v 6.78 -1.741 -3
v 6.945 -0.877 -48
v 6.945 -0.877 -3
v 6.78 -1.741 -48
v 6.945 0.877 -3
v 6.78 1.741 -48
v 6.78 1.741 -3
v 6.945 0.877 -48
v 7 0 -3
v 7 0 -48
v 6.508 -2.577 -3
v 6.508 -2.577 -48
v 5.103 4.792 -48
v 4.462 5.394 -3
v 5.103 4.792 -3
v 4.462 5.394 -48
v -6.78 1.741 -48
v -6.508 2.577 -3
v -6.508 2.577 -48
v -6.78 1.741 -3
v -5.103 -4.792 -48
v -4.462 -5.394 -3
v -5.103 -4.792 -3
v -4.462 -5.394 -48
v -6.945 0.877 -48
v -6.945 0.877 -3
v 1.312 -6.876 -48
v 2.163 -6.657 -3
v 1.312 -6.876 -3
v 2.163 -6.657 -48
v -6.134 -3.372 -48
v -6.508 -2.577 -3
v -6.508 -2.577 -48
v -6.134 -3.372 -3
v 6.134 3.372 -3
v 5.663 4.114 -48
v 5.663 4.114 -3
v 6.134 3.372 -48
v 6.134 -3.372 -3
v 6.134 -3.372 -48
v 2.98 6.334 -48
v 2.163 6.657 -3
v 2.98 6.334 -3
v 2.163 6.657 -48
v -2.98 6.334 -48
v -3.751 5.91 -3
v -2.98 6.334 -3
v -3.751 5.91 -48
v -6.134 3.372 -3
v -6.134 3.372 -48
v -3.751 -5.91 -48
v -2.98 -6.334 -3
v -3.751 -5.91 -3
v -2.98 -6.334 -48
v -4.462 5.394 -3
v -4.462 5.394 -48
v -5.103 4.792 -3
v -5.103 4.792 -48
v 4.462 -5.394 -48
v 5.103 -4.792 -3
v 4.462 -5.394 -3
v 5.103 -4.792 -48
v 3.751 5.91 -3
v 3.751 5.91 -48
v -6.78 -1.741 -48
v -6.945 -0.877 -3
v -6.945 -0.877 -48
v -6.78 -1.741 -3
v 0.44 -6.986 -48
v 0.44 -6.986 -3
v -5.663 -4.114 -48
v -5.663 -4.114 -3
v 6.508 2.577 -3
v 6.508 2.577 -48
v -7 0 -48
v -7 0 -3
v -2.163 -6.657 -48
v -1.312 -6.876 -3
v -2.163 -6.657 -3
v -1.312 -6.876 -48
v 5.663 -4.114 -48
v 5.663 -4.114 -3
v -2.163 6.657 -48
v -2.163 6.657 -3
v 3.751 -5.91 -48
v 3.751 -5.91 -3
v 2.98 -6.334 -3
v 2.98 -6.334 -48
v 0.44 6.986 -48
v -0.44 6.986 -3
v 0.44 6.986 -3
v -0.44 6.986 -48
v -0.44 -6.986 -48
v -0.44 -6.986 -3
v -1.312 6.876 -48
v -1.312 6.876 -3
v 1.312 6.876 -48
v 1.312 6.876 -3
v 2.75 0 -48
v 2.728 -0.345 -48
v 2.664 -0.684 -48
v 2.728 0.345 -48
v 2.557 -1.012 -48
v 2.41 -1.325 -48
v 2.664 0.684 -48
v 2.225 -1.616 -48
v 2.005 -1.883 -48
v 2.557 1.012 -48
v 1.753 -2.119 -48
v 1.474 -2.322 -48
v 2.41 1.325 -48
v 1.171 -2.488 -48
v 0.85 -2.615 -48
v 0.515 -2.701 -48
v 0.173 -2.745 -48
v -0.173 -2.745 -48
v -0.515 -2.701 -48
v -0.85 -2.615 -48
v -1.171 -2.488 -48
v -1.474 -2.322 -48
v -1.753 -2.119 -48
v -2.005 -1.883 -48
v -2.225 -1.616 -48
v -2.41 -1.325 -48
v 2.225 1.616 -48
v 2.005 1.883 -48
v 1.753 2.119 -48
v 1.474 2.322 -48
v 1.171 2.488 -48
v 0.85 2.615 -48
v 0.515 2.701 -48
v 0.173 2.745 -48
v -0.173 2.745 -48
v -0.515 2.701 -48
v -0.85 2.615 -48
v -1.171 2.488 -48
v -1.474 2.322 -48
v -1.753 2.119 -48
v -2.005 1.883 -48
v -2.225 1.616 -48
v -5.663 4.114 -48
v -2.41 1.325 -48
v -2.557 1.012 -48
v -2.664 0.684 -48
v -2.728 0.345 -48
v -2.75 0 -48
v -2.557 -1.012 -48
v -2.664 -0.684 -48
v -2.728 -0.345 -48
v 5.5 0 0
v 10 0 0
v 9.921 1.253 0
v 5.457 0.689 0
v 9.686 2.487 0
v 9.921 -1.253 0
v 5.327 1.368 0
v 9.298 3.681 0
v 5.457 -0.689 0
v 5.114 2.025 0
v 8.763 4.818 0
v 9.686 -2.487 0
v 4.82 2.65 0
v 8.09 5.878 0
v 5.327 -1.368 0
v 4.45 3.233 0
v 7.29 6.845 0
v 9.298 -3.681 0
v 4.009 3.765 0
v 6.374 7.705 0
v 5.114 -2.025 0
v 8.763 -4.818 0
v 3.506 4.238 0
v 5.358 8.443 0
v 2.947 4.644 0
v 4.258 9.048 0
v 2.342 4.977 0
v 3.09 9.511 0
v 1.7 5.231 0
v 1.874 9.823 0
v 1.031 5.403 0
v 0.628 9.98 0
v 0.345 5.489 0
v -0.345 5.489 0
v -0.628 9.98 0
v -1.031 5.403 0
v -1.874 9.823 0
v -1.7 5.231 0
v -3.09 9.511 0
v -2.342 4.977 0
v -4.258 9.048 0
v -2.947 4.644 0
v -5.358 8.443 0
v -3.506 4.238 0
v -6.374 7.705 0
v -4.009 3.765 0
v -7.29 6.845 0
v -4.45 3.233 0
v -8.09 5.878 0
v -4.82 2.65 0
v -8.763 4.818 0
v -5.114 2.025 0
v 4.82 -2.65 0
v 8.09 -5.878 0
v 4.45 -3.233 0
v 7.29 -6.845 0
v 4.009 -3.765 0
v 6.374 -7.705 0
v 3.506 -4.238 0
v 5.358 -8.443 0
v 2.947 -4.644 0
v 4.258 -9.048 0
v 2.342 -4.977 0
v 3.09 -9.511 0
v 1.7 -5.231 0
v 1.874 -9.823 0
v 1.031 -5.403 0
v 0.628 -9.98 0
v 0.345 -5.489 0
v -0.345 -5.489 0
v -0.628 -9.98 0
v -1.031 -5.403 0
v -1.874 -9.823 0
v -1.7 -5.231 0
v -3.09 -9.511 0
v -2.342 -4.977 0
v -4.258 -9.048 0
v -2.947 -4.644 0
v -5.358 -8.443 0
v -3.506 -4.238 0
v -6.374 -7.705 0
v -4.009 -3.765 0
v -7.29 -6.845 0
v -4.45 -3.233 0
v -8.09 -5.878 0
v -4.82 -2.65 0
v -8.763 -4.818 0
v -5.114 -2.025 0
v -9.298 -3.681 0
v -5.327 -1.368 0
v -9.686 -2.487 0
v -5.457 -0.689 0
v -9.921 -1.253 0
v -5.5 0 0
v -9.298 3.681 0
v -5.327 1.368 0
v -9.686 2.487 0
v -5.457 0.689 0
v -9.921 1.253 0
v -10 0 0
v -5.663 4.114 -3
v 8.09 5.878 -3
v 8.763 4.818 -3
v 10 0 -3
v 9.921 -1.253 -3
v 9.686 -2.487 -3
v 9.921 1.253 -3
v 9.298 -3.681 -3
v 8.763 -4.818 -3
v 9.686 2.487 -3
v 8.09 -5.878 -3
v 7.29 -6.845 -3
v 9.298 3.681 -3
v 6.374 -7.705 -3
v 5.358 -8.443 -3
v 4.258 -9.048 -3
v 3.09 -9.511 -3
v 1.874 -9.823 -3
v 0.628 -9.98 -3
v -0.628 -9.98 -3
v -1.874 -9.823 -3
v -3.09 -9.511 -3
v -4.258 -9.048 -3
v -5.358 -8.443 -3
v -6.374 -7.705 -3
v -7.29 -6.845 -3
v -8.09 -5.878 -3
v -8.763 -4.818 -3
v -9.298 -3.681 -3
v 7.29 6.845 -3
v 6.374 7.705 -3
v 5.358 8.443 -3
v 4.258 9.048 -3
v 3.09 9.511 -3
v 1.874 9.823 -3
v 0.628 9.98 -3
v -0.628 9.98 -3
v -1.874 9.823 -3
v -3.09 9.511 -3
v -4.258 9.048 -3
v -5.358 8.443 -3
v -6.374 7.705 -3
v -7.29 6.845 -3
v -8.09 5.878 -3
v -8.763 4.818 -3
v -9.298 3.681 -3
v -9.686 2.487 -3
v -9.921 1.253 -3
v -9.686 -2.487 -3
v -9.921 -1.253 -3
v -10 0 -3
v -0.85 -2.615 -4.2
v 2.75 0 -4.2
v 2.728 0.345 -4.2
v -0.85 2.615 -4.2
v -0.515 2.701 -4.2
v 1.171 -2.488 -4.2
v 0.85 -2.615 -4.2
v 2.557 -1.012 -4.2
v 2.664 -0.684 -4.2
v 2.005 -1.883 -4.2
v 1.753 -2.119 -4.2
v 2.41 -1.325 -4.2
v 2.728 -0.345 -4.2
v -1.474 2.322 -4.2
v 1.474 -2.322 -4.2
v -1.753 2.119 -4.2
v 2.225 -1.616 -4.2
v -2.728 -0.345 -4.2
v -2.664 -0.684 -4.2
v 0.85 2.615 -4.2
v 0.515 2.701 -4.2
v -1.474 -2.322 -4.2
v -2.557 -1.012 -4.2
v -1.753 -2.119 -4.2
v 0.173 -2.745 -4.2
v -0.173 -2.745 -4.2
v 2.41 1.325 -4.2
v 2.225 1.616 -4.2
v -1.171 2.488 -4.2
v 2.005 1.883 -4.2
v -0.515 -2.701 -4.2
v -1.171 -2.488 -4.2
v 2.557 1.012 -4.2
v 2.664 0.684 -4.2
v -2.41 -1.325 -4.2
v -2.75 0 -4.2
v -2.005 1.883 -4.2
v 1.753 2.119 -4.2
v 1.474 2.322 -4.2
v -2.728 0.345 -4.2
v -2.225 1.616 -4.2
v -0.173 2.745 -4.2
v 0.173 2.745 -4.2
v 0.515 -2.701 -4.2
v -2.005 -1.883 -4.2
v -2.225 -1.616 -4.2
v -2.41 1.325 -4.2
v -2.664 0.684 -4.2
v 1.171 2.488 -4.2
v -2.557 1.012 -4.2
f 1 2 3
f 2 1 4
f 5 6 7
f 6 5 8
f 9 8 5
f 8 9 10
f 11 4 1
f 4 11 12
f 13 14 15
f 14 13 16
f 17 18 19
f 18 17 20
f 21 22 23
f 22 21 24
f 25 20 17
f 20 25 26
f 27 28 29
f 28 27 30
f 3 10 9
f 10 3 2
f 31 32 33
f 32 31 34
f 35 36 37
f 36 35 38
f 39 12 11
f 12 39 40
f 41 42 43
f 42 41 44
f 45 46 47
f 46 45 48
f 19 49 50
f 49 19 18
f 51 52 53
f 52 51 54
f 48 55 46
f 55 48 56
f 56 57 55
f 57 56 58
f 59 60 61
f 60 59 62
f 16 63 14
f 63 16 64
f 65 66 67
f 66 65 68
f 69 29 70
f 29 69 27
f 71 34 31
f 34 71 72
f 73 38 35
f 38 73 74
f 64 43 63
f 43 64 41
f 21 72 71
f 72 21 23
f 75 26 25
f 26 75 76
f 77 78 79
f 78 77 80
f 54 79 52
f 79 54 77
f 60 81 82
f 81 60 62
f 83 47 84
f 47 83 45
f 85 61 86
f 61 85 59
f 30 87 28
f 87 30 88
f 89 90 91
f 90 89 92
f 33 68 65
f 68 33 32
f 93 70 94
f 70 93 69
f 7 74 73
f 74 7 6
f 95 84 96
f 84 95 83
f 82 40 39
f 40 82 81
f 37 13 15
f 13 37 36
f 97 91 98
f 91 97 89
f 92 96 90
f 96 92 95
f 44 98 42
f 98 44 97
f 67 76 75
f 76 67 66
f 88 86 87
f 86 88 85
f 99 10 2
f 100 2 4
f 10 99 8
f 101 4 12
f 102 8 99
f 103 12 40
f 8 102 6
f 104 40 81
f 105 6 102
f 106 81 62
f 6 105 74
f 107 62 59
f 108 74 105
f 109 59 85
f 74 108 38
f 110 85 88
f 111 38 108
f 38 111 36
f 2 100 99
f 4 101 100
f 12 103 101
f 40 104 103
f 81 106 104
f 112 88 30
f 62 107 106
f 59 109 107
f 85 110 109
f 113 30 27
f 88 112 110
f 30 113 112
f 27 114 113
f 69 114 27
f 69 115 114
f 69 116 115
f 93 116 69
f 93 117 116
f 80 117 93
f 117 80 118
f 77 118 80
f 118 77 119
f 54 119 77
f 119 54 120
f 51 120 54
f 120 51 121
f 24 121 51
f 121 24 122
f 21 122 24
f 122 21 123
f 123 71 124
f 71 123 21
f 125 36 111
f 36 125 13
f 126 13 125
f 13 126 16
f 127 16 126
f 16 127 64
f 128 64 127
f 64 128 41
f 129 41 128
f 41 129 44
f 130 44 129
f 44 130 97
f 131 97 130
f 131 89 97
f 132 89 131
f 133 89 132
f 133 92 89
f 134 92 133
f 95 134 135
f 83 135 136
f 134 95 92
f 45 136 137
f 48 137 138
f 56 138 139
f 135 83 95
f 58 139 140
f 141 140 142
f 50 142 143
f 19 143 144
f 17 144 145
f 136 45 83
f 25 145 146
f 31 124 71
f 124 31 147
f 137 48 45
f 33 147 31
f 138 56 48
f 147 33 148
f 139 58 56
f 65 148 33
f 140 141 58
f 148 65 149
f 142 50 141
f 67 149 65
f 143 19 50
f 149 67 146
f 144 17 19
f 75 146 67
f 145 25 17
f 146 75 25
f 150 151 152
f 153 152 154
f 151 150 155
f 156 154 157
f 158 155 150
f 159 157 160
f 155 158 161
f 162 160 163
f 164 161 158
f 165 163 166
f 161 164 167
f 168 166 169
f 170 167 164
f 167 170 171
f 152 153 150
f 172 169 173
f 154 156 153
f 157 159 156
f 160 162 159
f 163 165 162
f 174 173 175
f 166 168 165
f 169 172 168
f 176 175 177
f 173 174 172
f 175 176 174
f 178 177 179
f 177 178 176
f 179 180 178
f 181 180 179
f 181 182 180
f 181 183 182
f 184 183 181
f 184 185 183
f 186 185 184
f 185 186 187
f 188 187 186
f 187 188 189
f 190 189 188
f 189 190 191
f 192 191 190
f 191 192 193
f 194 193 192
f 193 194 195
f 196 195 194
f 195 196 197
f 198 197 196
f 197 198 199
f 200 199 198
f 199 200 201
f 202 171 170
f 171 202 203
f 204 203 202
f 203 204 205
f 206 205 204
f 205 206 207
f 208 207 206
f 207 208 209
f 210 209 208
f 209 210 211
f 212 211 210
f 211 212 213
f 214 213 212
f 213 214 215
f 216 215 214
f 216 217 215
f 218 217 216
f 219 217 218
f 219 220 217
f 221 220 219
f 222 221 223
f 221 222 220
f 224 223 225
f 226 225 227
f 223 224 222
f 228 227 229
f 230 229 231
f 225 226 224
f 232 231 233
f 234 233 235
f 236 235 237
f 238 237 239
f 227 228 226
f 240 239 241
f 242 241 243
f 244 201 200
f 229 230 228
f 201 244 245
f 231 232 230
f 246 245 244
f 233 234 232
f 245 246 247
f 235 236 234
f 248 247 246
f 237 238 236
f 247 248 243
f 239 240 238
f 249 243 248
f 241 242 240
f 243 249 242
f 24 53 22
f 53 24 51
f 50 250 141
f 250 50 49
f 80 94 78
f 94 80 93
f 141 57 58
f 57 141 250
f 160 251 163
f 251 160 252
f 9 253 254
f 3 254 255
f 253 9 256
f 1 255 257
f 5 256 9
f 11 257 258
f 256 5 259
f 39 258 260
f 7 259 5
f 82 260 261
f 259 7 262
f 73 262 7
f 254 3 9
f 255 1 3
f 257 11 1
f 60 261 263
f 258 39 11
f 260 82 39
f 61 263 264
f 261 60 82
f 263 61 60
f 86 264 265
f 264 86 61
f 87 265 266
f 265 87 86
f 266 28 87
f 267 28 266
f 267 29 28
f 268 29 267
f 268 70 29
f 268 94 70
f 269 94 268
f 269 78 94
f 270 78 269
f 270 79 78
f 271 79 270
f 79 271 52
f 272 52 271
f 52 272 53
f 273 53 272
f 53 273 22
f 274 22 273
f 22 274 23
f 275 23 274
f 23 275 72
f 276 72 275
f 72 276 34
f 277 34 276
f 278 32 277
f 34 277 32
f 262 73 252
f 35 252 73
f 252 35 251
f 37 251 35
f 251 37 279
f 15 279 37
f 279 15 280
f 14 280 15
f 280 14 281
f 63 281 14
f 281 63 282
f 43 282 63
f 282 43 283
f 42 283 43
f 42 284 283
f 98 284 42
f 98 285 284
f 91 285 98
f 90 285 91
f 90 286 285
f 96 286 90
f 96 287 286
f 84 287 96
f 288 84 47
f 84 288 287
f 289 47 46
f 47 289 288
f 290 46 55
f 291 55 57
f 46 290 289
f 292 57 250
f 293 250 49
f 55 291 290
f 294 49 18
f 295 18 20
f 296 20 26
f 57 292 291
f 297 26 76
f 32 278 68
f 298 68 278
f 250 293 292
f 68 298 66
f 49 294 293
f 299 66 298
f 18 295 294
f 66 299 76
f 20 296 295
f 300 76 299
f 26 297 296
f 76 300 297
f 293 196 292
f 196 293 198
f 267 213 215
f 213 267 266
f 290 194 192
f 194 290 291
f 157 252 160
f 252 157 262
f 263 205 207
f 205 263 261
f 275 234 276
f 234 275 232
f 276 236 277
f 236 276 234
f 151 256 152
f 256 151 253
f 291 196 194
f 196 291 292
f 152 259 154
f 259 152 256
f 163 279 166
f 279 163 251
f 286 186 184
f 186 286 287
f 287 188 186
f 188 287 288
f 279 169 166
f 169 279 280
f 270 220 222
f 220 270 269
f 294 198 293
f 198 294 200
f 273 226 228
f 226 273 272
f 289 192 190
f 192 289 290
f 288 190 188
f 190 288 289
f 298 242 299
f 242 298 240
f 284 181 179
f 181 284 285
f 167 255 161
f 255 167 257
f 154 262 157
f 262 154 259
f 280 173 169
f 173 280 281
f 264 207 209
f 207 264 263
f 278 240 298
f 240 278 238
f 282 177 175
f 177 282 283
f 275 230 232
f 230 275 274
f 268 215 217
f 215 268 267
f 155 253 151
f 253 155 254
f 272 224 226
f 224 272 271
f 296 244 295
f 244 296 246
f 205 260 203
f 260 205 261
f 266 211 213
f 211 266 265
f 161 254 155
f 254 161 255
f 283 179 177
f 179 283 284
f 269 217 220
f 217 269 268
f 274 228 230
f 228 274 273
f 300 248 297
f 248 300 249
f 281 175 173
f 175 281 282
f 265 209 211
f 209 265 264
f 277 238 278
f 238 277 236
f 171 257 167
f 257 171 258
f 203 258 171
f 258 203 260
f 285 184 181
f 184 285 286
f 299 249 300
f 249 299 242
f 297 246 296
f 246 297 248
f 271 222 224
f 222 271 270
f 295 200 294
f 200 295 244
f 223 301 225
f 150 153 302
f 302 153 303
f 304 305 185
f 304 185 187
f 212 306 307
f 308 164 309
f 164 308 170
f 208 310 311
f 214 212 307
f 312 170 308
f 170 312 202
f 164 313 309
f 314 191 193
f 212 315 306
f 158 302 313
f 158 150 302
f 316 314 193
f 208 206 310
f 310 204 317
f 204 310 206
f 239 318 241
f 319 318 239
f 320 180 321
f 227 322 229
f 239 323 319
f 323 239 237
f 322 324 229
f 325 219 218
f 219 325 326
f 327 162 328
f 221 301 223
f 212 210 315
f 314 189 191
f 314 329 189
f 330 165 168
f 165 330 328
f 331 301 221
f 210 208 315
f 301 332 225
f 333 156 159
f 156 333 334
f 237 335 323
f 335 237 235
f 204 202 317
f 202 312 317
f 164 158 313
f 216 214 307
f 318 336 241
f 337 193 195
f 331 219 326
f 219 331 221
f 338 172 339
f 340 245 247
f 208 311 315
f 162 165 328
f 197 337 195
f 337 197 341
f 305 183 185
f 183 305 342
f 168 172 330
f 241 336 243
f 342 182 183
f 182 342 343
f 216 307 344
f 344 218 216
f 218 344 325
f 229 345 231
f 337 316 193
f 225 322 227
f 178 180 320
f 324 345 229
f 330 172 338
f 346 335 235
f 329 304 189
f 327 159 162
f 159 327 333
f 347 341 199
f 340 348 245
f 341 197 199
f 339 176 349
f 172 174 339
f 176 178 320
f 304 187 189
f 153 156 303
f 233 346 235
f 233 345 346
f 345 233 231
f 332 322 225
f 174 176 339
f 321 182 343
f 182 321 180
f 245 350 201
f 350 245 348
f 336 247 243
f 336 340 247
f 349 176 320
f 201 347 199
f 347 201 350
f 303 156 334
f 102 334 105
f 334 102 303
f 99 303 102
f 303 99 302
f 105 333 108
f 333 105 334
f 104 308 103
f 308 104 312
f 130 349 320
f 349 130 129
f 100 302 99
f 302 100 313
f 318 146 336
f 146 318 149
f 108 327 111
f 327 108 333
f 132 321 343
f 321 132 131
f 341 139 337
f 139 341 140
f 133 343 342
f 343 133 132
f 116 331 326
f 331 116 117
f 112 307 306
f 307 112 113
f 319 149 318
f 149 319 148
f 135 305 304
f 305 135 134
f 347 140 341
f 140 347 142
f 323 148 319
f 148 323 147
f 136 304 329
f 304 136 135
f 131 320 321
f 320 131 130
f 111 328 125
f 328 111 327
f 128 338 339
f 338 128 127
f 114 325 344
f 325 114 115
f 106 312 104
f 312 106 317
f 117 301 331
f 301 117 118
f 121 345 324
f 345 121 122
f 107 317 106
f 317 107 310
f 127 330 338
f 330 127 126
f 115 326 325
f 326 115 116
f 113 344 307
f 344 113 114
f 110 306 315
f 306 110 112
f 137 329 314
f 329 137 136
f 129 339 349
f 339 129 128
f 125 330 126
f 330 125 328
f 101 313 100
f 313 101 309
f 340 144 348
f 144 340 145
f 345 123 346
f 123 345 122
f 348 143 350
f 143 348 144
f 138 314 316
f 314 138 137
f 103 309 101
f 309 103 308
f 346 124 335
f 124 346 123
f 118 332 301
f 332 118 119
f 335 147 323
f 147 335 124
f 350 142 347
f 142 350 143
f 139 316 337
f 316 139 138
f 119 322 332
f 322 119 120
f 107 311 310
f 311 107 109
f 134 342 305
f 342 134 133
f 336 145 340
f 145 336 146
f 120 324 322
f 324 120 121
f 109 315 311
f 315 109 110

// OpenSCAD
$fn = 50;


difference() {
	union() {
		translate(v = [0, 0, -48.0000000000]) {
			cylinder(h = 48, r = 7.0000000000);
		}
		translate(v = [0, 0, -3.0000000000]) {
			cylinder(h = 3, r = 10.0000000000);
		}
	}
	union() {
		translate(v = [0, 0, 0]) {
			rotate(a = [0, 0, 0]) {
				difference() {
					union() {
						#translate(v = [0, 0, -48.0000000000]) {
							cylinder(h = 48, r = 2.2500000000);
						}
						#translate(v = [0, 0, -4.2000000000]) {
							cylinder(h = 4.2000000000, r = 7.0000000000, r1 = 2.7500000000, r2 = 5.5000000000);
						}
						#translate(v = [0, 0, -48.0000000000]) {
							cylinder(h = 48, r = 2.7500000000);
						}
						#translate(v = [0, 0, -48.0000000000]) {
							cylinder(h = 48, r = 2.2500000000);
						}
					}
					union();
				}
			}
		}
	}
}
